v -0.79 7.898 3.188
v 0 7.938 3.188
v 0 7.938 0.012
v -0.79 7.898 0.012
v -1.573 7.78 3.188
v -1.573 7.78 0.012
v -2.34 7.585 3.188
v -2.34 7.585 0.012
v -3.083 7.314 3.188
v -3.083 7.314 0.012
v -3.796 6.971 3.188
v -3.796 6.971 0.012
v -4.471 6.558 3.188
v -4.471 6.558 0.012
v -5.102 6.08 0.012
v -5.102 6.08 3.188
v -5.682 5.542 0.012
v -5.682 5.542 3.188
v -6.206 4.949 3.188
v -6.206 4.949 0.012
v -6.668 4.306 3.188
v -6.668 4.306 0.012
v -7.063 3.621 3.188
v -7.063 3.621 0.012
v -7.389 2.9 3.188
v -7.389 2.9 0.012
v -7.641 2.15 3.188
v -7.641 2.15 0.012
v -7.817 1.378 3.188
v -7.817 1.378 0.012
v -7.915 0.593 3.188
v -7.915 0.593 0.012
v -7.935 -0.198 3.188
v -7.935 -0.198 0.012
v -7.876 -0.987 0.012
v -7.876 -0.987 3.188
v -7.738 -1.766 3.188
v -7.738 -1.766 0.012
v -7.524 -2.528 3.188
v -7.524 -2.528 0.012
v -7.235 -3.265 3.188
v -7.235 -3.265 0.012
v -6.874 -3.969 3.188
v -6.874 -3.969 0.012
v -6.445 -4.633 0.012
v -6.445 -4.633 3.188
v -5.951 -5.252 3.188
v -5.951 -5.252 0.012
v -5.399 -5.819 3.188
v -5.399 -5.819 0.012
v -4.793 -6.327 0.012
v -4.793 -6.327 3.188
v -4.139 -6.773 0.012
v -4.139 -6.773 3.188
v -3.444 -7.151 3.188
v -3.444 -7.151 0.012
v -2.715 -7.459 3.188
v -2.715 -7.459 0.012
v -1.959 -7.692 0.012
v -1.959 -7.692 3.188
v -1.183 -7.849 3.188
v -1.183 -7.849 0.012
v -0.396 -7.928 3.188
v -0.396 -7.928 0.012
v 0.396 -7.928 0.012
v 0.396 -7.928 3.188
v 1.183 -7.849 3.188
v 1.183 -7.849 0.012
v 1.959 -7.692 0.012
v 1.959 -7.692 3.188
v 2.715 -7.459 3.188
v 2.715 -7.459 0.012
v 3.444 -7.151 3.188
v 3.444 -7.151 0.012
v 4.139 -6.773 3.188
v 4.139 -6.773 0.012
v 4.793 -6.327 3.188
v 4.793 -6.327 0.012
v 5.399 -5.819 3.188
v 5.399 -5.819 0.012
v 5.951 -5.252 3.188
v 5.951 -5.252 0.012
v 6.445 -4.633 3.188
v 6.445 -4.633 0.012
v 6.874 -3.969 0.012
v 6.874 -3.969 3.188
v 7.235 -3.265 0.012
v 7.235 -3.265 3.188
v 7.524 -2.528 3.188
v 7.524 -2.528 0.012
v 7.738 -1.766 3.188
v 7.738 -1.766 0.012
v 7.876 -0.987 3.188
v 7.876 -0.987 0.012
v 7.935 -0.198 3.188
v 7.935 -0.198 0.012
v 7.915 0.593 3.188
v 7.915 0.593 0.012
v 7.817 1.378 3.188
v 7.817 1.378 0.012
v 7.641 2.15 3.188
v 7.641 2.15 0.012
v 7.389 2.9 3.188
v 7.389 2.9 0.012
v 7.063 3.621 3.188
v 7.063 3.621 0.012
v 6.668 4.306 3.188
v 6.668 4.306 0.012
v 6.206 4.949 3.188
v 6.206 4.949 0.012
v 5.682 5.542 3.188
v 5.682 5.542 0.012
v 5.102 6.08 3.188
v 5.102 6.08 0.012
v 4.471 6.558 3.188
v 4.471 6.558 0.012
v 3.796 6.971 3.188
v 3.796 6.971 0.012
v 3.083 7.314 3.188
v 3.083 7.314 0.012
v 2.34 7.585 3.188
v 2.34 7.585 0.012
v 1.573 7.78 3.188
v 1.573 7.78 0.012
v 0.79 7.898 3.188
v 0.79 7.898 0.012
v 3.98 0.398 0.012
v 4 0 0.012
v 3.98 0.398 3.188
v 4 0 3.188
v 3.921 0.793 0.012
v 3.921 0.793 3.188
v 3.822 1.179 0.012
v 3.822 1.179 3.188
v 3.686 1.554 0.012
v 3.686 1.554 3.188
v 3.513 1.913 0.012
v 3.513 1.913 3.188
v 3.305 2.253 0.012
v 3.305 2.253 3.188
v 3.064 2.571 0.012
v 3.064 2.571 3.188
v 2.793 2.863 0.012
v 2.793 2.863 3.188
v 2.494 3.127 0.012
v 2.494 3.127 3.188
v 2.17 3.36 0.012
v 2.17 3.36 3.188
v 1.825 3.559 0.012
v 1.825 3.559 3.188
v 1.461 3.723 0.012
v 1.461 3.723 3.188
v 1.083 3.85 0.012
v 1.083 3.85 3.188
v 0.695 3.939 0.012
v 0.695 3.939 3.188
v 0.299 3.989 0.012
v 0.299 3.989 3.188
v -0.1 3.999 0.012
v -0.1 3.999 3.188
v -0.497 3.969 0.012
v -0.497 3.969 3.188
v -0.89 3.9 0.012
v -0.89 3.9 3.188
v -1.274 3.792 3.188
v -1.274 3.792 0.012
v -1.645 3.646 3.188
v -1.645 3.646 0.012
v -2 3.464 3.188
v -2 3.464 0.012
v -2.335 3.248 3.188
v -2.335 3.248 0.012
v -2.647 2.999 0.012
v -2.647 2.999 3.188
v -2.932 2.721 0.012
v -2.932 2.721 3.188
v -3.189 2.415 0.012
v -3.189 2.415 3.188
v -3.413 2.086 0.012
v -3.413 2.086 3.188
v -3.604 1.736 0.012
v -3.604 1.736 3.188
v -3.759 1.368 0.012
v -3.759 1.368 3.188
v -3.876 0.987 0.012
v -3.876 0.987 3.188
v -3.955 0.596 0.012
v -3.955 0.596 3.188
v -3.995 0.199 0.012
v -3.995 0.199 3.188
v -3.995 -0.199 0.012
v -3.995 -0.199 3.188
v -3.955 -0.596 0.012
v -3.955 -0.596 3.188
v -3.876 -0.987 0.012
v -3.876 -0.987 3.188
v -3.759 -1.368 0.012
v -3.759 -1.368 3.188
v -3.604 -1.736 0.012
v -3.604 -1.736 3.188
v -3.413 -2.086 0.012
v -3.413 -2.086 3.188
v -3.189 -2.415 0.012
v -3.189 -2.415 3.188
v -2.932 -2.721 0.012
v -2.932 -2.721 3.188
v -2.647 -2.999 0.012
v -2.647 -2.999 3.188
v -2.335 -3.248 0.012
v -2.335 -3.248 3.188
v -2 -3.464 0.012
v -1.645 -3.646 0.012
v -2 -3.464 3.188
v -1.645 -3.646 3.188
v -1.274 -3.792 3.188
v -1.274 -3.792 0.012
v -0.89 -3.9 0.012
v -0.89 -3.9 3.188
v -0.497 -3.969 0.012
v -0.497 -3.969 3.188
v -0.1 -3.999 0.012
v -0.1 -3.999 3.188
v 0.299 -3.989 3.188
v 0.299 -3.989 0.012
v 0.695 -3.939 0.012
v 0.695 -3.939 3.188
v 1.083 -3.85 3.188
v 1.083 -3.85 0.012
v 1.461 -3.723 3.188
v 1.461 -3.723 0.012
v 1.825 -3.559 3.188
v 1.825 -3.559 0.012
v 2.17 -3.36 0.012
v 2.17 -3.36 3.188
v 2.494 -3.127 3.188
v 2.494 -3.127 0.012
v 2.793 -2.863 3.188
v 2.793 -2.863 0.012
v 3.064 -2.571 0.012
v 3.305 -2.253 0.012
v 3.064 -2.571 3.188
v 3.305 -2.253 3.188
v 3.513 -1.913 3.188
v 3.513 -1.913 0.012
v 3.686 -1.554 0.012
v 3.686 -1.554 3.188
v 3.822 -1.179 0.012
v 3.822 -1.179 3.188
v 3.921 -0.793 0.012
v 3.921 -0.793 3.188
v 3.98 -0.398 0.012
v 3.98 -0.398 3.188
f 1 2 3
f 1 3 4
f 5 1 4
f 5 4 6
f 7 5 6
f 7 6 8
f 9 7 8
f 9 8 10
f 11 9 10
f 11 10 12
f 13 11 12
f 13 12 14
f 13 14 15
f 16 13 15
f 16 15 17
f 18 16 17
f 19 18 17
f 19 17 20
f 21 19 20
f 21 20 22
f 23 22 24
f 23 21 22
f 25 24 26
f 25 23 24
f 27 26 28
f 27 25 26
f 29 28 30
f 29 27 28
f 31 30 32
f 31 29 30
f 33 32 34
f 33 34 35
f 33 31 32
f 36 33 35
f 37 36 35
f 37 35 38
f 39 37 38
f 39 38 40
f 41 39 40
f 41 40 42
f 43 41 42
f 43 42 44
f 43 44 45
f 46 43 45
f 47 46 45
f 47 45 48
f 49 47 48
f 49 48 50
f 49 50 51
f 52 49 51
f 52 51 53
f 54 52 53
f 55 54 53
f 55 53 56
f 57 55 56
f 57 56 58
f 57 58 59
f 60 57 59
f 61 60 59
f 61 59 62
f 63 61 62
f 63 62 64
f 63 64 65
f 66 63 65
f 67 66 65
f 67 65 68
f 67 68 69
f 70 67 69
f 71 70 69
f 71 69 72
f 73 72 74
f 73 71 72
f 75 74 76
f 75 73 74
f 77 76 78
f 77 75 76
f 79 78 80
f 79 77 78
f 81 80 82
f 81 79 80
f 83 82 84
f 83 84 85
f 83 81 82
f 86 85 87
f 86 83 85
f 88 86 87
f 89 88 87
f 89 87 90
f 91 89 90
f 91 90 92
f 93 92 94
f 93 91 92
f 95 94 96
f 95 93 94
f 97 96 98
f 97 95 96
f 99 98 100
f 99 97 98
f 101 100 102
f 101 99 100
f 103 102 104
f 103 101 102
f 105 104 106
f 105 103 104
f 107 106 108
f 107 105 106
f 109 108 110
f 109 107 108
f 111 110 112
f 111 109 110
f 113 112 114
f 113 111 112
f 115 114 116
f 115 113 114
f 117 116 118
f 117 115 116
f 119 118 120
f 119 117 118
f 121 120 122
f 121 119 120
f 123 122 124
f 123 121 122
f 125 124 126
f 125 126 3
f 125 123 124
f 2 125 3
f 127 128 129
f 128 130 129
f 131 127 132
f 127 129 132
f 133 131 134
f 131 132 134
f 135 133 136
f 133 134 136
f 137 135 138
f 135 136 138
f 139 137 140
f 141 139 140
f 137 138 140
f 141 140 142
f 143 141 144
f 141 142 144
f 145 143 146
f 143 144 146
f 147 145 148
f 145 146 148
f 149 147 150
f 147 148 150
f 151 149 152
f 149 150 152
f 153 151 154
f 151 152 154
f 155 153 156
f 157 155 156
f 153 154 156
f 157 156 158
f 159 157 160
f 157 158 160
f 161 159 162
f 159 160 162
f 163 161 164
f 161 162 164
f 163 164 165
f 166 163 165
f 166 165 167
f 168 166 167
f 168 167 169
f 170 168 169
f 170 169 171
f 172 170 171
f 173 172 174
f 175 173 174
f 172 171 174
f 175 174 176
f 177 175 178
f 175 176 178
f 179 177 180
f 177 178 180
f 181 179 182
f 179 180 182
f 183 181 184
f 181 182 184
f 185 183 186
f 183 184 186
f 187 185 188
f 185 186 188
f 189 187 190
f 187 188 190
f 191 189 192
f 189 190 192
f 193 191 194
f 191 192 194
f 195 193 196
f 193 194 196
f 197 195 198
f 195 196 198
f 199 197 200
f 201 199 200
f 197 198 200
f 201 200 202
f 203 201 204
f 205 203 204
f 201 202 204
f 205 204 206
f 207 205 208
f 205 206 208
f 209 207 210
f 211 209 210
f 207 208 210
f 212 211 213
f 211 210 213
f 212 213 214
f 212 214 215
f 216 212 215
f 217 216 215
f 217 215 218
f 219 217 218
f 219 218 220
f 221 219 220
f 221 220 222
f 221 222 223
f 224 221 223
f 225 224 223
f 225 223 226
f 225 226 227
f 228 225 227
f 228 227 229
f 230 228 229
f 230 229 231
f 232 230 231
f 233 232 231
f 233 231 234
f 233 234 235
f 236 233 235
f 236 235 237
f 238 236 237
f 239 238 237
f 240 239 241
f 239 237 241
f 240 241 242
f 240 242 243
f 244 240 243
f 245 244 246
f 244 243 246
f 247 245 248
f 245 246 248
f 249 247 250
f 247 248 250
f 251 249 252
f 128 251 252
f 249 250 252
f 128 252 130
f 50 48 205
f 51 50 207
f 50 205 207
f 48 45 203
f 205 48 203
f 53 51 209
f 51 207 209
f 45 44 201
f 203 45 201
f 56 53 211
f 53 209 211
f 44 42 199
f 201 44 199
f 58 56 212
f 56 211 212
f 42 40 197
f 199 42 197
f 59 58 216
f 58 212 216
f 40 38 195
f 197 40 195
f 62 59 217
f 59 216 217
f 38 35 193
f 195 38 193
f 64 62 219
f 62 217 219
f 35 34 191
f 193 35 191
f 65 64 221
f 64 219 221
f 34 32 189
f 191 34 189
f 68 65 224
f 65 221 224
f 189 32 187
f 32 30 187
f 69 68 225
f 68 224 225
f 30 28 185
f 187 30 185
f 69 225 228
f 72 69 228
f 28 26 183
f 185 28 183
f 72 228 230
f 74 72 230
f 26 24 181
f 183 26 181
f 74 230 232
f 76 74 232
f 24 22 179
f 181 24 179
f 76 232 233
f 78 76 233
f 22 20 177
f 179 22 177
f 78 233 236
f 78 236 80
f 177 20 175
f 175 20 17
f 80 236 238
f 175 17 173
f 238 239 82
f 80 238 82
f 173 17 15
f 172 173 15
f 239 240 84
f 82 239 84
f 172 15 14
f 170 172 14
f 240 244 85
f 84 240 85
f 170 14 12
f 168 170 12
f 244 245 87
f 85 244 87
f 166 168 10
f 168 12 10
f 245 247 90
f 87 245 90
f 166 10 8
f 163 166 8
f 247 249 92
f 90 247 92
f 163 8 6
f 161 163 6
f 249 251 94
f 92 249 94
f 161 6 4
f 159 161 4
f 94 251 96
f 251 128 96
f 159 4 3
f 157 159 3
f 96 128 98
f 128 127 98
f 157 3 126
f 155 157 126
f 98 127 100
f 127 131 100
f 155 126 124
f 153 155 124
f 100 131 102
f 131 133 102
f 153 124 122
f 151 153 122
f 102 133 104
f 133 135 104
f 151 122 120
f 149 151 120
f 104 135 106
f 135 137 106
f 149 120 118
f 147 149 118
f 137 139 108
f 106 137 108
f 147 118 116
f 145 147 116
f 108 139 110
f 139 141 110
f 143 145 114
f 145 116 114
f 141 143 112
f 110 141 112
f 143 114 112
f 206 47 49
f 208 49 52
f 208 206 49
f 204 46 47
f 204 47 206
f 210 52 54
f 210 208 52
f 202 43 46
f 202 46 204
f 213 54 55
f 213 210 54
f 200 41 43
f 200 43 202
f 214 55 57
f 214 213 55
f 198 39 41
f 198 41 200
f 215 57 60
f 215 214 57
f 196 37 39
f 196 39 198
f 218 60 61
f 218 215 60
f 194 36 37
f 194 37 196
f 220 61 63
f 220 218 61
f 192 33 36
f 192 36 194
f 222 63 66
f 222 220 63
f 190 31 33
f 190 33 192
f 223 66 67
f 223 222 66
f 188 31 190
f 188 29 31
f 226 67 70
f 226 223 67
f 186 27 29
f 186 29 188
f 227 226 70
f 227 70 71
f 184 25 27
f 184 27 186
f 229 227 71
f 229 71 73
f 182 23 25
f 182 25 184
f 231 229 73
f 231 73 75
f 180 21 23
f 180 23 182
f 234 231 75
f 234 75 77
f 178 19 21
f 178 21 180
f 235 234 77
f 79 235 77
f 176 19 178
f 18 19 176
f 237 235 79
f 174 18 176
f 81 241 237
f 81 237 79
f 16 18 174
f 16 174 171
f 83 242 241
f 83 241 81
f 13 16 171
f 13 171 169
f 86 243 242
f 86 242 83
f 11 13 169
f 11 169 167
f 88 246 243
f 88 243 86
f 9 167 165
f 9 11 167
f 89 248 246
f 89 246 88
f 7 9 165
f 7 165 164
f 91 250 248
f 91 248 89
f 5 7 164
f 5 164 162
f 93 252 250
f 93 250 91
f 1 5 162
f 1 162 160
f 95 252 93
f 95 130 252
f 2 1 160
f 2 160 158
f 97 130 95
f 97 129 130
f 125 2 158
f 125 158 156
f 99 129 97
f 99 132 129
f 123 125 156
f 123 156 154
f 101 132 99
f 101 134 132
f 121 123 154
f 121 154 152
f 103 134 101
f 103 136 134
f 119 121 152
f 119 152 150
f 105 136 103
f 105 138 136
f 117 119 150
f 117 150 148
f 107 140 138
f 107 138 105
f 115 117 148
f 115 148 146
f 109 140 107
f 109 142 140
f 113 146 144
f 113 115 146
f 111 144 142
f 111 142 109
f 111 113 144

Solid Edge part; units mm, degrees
sketch "Sketch1" plane through (0, 0, 0) normal (0, 0, 1) x (1, 0, 0)
  circle A0 centre (0, 0) radius 6
  circle A1 centre (0, 0) radius 3.2
extrude "Protrusion1" add sketch "Sketch1" along normal blind 1.6
sketch "Sketch2" plane through (0, 0, 1.6) normal (0, 0, 1) x (0, 1, 0)
  circle A0 centre (0, 0) radius 7.9375
extrude "Protrusion2" add sketch "Sketch2" along normal mid plane 3.175
sketch "Sketch3" plane through (0, 0, 3.1875) normal (0, 0, 1) x (1, 0, 0)
  circle A0 centre (0, 0) radius 4
extrude "ExtrudedCutout_1" cut sketch "Sketch3" against normal blind 10.8687
sketch "Sketch4" plane through (0, 0, 0) normal (0, 0, -1) x (0, 1, 0)
  circle A0 centre (0, 0) radius 6
extrude "Cutout1" cut sketch "Sketch4" against normal up to vertex (0.0125 mm away)
properties material "Steel"
